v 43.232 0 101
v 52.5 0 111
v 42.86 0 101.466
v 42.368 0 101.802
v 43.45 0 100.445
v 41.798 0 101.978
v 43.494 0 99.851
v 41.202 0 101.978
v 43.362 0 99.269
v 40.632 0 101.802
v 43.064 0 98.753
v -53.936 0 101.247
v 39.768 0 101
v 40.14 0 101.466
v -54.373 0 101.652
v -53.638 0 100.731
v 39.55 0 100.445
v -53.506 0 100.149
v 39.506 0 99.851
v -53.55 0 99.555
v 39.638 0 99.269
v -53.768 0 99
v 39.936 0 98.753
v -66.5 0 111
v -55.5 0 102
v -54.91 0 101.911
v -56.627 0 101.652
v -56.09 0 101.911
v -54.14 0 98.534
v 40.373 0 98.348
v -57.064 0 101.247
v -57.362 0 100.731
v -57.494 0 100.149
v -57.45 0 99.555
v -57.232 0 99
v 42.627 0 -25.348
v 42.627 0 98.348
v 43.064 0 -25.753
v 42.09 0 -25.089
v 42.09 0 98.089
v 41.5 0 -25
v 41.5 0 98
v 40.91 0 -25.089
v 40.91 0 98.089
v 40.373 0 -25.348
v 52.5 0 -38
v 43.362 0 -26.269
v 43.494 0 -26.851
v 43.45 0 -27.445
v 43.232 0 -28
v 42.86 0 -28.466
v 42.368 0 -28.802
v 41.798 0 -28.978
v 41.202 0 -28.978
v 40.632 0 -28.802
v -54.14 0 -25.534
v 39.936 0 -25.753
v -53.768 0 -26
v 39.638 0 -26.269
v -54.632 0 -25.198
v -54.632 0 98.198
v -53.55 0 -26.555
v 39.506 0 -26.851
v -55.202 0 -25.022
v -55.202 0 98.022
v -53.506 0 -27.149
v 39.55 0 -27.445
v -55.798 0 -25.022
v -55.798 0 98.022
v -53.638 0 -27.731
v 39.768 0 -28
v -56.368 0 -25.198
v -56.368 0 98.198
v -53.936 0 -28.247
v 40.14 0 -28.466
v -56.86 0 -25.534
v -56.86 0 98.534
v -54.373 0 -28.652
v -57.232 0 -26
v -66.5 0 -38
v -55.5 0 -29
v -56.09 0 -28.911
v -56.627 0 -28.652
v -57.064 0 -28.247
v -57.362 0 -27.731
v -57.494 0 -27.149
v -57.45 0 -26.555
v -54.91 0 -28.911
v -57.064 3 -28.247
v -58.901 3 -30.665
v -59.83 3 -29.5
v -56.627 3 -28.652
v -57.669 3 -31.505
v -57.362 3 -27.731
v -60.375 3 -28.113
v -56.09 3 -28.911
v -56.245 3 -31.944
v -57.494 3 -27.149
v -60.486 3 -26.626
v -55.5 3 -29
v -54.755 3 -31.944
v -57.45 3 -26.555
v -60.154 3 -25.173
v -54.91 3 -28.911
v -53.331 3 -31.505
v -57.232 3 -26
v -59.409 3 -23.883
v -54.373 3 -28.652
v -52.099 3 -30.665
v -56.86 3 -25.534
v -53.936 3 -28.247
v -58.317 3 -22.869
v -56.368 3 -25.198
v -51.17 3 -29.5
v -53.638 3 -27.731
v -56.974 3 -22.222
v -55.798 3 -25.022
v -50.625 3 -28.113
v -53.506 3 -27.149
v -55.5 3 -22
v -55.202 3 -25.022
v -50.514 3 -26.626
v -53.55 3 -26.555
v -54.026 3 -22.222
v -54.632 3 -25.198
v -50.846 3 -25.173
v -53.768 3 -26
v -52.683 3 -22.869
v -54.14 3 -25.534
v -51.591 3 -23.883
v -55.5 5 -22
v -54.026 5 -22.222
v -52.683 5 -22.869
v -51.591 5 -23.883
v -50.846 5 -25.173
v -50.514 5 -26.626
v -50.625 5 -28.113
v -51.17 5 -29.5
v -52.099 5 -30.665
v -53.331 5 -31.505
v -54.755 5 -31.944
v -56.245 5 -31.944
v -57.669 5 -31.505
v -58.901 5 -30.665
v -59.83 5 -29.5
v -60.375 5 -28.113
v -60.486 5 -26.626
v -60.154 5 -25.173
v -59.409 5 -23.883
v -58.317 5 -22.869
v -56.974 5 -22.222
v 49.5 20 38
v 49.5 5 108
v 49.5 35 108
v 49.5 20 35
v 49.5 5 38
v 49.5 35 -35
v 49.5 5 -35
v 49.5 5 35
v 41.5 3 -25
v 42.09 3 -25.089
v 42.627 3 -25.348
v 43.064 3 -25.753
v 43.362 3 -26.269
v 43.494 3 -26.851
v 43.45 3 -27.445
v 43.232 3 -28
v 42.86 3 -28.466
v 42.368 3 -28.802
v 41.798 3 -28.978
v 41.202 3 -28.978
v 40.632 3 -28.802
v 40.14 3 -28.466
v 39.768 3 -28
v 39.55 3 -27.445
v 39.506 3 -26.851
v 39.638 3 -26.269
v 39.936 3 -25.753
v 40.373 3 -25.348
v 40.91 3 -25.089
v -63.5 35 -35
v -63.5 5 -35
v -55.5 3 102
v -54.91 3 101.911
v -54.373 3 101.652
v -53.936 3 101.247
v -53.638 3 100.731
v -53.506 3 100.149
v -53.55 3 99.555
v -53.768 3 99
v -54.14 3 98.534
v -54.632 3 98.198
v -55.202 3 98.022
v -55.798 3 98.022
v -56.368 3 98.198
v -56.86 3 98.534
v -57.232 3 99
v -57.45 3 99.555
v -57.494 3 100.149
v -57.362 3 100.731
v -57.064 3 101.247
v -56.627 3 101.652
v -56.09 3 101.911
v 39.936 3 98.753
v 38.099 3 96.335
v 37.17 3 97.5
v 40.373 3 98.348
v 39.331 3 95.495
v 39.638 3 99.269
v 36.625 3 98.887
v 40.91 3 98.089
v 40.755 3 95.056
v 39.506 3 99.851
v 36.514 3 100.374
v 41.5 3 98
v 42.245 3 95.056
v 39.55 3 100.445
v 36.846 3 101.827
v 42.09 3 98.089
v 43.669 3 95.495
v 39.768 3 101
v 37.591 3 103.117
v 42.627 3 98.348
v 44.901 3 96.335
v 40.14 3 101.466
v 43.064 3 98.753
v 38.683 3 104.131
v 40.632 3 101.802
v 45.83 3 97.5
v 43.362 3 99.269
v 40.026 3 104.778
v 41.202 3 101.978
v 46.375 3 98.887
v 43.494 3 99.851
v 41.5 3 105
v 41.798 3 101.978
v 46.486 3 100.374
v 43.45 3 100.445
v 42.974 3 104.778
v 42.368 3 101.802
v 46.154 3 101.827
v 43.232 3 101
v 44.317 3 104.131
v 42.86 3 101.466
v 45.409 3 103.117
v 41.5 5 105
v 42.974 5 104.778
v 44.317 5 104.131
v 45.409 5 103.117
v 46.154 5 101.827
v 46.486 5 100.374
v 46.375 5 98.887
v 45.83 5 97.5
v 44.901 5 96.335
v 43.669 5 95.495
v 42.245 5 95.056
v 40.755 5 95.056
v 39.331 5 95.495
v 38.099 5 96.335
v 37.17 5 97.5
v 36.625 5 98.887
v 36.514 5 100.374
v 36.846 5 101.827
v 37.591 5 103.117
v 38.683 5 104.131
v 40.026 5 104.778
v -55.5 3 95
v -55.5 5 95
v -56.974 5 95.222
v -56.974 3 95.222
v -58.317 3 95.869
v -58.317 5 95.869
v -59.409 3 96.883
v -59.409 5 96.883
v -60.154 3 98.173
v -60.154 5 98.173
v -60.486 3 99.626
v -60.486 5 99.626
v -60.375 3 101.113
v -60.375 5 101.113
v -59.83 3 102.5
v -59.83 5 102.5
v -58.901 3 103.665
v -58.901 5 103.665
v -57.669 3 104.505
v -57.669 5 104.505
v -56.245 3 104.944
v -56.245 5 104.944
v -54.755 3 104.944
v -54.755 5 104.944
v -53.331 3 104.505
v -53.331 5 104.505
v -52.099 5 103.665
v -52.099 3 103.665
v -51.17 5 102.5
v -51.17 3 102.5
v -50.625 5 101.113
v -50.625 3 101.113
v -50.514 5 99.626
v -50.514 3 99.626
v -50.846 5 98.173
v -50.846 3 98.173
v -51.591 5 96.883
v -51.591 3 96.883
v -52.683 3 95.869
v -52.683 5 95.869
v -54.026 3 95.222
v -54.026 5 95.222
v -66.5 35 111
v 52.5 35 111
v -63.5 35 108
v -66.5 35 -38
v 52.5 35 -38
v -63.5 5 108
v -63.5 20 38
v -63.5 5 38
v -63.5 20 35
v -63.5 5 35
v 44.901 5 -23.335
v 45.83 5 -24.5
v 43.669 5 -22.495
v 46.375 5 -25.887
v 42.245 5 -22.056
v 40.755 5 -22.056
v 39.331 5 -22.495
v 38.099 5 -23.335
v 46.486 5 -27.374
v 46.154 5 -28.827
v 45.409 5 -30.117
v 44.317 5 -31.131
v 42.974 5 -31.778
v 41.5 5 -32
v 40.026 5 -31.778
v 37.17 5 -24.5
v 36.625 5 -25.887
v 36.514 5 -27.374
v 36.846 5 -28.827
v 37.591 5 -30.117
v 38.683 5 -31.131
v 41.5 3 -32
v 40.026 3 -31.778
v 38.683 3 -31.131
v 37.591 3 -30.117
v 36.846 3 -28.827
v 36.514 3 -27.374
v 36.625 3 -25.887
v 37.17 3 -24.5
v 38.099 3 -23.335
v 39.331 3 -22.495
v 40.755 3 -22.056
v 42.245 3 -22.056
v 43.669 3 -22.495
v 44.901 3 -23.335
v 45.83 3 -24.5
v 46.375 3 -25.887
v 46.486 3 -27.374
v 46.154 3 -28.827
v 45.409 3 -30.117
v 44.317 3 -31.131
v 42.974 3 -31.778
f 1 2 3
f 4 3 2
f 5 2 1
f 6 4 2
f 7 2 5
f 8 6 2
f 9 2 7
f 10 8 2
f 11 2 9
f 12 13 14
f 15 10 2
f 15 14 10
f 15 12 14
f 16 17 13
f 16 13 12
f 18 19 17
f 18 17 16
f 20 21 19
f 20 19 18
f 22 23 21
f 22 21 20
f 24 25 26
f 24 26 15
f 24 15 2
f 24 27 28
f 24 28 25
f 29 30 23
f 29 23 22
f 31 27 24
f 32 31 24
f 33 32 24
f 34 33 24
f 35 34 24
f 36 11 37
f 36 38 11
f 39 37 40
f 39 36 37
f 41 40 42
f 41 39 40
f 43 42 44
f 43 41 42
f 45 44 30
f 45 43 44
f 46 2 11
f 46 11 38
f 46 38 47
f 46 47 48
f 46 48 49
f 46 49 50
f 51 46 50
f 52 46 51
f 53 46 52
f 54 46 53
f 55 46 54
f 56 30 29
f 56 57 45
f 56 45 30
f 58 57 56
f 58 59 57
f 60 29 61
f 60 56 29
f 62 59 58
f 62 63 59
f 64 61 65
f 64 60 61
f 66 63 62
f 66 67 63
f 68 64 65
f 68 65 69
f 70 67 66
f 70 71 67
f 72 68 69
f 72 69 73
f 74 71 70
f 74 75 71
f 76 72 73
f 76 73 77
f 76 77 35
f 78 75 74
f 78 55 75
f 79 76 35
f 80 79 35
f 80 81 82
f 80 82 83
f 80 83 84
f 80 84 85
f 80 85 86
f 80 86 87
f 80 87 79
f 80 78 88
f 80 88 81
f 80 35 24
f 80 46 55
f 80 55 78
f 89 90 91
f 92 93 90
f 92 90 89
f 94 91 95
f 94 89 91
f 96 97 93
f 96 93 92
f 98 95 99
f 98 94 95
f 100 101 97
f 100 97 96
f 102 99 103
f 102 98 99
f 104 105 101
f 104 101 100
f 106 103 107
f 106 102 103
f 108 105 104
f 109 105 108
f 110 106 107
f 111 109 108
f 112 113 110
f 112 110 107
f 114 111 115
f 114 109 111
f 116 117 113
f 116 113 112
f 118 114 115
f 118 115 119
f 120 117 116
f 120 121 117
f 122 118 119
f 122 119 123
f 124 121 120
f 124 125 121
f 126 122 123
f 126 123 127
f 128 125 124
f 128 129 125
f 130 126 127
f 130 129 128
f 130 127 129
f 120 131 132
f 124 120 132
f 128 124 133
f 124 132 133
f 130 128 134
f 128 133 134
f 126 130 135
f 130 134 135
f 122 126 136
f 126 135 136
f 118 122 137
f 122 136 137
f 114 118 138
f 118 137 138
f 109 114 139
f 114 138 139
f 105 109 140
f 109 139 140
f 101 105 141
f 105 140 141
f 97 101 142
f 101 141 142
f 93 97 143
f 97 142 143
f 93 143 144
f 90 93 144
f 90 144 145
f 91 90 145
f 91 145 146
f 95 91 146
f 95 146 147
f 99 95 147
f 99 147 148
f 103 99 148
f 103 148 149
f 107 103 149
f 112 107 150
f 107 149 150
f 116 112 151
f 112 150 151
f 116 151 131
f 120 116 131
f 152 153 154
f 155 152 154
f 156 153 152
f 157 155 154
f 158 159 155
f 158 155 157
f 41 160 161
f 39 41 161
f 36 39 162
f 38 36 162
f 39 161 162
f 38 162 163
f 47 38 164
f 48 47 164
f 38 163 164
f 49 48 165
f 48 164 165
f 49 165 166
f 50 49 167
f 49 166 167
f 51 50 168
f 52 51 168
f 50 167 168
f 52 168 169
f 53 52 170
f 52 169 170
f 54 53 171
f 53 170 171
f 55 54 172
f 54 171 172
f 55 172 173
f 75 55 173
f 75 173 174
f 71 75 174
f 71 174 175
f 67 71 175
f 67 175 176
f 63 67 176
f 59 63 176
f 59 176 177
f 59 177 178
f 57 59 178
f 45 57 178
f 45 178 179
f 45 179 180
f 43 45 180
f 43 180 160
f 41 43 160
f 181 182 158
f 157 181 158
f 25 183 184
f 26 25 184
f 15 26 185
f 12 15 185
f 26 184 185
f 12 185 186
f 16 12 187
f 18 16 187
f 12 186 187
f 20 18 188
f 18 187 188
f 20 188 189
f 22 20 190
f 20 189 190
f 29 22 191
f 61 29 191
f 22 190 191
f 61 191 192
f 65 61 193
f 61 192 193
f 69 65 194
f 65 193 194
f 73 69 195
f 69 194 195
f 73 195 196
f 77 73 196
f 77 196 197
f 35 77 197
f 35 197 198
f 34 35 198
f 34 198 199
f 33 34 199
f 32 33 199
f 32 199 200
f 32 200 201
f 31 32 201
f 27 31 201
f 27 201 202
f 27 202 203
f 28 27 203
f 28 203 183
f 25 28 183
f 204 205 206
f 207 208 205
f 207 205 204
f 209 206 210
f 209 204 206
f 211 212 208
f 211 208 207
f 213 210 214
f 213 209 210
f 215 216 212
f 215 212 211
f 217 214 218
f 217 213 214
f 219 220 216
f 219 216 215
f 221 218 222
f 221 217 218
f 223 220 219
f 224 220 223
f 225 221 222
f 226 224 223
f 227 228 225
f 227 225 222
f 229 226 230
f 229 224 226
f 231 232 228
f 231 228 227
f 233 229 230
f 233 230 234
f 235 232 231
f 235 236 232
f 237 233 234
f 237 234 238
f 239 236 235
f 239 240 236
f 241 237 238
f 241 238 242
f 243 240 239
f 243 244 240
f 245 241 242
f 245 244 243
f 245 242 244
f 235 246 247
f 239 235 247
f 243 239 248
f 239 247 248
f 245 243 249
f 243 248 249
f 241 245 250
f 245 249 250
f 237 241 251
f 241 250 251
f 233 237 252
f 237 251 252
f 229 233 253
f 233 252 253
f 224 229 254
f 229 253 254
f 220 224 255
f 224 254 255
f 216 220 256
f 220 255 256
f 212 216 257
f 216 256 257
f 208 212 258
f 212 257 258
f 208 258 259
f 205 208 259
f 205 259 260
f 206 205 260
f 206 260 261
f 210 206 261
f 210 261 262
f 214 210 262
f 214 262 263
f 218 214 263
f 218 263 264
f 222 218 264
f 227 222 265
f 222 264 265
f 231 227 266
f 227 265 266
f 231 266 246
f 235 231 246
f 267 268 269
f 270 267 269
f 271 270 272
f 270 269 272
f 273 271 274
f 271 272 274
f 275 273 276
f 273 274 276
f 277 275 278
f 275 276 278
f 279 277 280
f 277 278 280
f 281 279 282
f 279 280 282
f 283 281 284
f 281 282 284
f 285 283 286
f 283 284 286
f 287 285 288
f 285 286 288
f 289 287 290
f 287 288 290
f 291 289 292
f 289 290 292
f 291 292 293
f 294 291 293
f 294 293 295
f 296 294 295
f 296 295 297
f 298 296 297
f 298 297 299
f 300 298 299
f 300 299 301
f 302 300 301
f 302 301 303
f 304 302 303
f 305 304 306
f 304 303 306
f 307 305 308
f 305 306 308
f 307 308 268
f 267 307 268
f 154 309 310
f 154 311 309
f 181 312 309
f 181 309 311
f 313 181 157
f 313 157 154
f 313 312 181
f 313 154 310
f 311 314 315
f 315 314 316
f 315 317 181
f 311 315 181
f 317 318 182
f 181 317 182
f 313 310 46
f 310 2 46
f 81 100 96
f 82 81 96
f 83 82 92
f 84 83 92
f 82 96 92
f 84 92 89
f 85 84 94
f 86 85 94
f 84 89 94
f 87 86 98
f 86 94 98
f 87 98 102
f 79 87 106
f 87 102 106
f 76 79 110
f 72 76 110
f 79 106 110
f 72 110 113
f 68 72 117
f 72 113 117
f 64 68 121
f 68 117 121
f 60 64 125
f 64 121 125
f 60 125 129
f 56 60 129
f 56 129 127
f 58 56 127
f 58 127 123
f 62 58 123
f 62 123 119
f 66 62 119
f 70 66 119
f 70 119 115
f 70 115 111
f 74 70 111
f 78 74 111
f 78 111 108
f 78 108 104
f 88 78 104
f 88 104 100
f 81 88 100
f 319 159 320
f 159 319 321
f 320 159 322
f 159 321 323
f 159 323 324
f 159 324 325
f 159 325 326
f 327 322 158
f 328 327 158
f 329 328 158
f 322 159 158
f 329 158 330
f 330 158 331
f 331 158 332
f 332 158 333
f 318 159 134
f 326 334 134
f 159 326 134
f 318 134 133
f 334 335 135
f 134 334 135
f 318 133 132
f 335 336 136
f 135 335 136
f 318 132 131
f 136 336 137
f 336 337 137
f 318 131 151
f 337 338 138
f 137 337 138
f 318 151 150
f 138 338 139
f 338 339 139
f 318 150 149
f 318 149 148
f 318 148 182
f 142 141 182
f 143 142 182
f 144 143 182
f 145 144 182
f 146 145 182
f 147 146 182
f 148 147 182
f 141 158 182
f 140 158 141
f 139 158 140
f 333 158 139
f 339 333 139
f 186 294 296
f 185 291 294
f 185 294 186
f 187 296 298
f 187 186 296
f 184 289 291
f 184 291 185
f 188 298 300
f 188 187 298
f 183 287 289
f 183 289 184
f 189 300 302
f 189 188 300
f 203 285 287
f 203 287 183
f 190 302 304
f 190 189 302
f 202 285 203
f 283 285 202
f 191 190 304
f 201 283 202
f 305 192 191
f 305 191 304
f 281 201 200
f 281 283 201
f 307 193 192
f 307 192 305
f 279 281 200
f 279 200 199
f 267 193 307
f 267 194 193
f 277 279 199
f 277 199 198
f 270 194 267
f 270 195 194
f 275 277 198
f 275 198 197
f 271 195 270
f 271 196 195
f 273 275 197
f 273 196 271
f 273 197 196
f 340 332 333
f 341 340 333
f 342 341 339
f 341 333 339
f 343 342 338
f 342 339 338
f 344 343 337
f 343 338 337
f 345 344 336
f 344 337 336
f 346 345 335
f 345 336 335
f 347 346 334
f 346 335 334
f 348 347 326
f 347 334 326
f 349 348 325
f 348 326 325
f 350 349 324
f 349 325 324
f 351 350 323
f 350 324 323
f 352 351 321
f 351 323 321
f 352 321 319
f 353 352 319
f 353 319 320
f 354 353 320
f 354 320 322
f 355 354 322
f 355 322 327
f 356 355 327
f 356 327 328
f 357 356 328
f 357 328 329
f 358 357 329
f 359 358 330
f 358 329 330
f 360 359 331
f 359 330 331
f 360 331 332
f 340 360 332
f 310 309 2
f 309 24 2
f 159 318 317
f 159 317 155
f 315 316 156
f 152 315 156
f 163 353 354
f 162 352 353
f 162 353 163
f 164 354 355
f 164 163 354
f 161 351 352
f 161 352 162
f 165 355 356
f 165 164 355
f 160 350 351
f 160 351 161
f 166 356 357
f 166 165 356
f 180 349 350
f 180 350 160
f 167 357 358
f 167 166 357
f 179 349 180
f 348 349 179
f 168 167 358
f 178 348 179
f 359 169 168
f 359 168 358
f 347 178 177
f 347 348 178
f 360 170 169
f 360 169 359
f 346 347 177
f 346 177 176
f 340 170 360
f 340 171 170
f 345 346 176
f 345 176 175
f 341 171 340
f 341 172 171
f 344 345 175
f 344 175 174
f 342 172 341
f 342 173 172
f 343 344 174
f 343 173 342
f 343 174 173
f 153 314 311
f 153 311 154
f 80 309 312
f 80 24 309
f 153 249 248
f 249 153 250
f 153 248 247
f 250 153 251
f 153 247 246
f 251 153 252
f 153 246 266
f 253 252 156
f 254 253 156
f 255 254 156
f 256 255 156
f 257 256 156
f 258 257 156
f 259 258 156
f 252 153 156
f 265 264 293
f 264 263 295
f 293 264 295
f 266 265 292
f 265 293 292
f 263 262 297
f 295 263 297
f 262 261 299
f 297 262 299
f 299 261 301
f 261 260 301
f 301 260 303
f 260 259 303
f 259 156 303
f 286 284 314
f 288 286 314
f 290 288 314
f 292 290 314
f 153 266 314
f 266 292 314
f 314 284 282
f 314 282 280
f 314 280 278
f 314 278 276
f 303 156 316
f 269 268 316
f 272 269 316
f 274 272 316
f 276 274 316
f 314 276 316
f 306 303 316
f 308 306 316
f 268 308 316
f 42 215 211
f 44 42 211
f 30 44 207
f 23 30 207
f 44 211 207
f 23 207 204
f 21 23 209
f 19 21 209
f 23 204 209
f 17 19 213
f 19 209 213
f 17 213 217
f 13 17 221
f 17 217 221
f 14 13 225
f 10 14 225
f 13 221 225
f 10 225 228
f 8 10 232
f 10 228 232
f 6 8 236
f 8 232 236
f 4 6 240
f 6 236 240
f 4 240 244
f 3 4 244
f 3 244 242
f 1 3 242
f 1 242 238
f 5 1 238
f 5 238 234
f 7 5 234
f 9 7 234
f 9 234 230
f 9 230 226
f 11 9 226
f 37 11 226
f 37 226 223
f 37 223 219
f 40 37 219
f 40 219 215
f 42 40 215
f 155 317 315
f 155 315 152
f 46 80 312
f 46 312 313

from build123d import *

# Parameters (mm, degrees)
BOSS_EXTRUDE1_DEPTH = 5
SKETCH3_W           = 119
SKETCH3_H           = 149
SKETCH3_W_2         = 113
SKETCH3_H_2         = 70
BOSS_EXTRUDE3_DEPTH = 30
SKETCH7_W           = 113
SKETCH7_H           = 3
CUT_EXTRUDE2_DEPTH  = 15
SKETCH8_R           = 5
CUT_EXTRUDE3_DEPTH  = 2
SKETCH9_R           = 2
CUT_EXTRUDE4_DEPTH  = 15


with BuildPart() as part:
    # Sketch2 → Boss-Extrude1 (new body)
    with BuildSketch(Plane(origin=(0, 0, 0), x_dir=(1, 0, 0), z_dir=(0, 1, 0))):
        Polygon((-66.5, 35), (-66.5, 38), (52.5, 38), (52.5, -111), (-66.5, -111), align=None)
    extrude(amount=BOSS_EXTRUDE1_DEPTH)

    # Sketch3 → Boss-Extrude3 (add)
    with BuildSketch(Plane(origin=(0, 5, 0), x_dir=(1, 0, 0), z_dir=(0, 1, 0))):
        with Locations((-7, -36.5)):
            Rectangle(SKETCH3_W, SKETCH3_H)
        with Locations((-7, 0)):
            Rectangle(SKETCH3_W_2, SKETCH3_H_2, mode=Mode.SUBTRACT)
        with Locations((-7, -73)):
            Rectangle(SKETCH3_W_2, SKETCH3_H_2, mode=Mode.SUBTRACT)
    extrude(amount=BOSS_EXTRUDE3_DEPTH)

    # Sketch7 → Cut-Extrude2 (cut)
    with BuildSketch(Plane(origin=(0, 35, 0), x_dir=(1, 0, 0), z_dir=(0, 1, 0))):
        with Locations((-7, -36.5)):
            Rectangle(SKETCH7_W, SKETCH7_H)
    extrude(amount=-CUT_EXTRUDE2_DEPTH, mode=Mode.SUBTRACT)

    # Sketch8 → Cut-Extrude3 (cut)
    with BuildSketch(Plane(origin=(0, 5, 0), x_dir=(1, 0, 0), z_dir=(0, 1, 0))):
        with Locations(Location((-55.5, 27, 0), (0, 0, 270))):
            Circle(SKETCH8_R)
        with Locations(Location((41.5, 27, 0), (0, 0, 90))):
            Circle(SKETCH8_R)
        with Locations(Location((41.5, -100, 0), (0, 0, 270))):
            Circle(SKETCH8_R)
        with Locations(Location((-55.5, -100, 0), (0, 0, 90))):
            Circle(SKETCH8_R)
    extrude(amount=-CUT_EXTRUDE3_DEPTH, mode=Mode.SUBTRACT)

    # Sketch9 → Cut-Extrude4 (cut)
    with BuildSketch(Plane(origin=(0, 3, 0), x_dir=(1, 0, 0), z_dir=(0, 1, 0))):
        with Locations(Location((41.5, 27, 0), (0, 0, 270))):
            Circle(SKETCH9_R)
        with Locations(Location((-55.5, 27, 0), (0, 0, 90))):
            Circle(SKETCH9_R)
        with Locations(Location((41.5, -100, 0), (0, 0, 90))):
            Circle(SKETCH9_R)
        with Locations(Location((-55.5, -100, 0), (0, 0, 270))):
            Circle(SKETCH9_R)
    extrude(amount=-CUT_EXTRUDE4_DEPTH, mode=Mode.SUBTRACT)


solid = part.part
